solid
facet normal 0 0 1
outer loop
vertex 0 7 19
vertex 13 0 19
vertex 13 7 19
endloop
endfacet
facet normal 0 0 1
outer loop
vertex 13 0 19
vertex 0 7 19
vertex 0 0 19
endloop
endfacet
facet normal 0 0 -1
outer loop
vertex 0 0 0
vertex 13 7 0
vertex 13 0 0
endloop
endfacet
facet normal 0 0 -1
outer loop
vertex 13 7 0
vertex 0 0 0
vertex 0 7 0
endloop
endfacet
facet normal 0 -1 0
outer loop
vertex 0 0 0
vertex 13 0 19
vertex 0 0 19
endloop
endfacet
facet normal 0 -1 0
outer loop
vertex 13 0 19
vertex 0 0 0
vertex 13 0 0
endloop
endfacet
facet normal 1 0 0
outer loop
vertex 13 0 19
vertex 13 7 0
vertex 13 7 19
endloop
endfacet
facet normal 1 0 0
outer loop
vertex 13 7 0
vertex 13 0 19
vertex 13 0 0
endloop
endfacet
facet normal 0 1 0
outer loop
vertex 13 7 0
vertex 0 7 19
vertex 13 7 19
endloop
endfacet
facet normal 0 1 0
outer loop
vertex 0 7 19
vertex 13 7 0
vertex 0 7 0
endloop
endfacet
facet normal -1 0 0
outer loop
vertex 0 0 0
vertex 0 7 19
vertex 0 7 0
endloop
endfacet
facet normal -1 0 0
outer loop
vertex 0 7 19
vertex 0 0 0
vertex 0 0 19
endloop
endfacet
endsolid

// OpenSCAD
// Generated by SolidPython 1.0.1 on 2020-07-29 00:46:55


cube(size = [13, 7, 19]);
/***********************************************
*********      SolidPython code:      **********
************************************************
 
# import packages: SolidPython
from solid import *
from solid.utils import *
from itertools import chain, combinations, permutations


class Resize:

    def __init__(self, scad_file):
        self.scad_file = scad_file
        #self.scad_file = import_scad(scad_file)
        # cone/cylinder param:
        self.r1 = 0
        self.r2 = 0
        self.h = 0
        # rectangular prism param:
        self.w = 0
        self.l = 0
        # ellipse param:
        self.r = 0

    # import OpenScad code (file name corresponds to shape)


    # classify shape + parameters
    def assign(self, param1, param2, param3):
        if self.scad_file == 'cone.scad':
            self.r1 = param1
            self.r2 = param2
            self.h = param3
        elif self.scad_file == 'cylinder.scad':
            self.r1 = param1
            self.r2 = param2
            self.h = param3
        elif self.scad_file == 'rectangularPrism.scad':
            self.h = param1
            self.l = param2
            self.w = param3
        else:
            self.r = param1
            self.h = param2

    # resize parameters
    def iterate(self):
        x = range(3, 20, 2)
        i = 1
        if self.scad_file == 'cone.scad':
            tempList = list(permutations(x, 2))
            for temp in tempList:
                param1 = temp[0]
                param2 = temp[1]
                filepath = 'produced_scad_files/' + 'cone' + str(param1) + '_' + str(param2) + '_' + '.scad'
                scad_render_to_file(cylinder(h=param1, r1=param2, r2=0), filepath)

        elif self.scad_file == 'cylinder.scad':
            tempList = list(permutations(x, 3))
            for temp in tempList:
                param1 = temp[0]
                param2 = temp[1]
                filepath = 'produced_scad_files/' + 'cylinder' + str(param1) + '_' + str(param2) + '_' + '.scad'
                scad_render_to_file(cylinder(h=param1, r1=param2, r2=param2), filepath)

        elif self.scad_file == 'rectangularPrism.scad':
            tempList = list(permutations(x, 3))
            for temp in tempList:
                param1 = temp[0]
                param2 = temp[1]
                param3 = temp[2]
                filepath = 'produced_scad_files/' + 'rectangularPrism' + str(param1) + '_' + str(param2) + '_' + str(
                    param3) + '.scad'
                scad_render_to_file(cube(size=(param1, param2, param3)), filepath)

        elif self.scad_file == 'ellipse.scad':
            tempList = list(permutations(x, 4))
            for temp in tempList:
                param1 = temp[0]
                param2 = temp[1]
                param3 = temp[2]
                param4 = temp[3]
                filepath = 'produced_scad_files/' + 'ellipse' + str(param1) + '_' + str(param2) + '_' + str(param3) + '_' + str(param4) + '.scad'
                scad_render_to_file(scale([param1, param2, param3])(sphere(r=param4)), filepath)

    def render_to_scadfile(self):
        scad_render_to_file(scad, 'example.scad') 
 
************************************************/
